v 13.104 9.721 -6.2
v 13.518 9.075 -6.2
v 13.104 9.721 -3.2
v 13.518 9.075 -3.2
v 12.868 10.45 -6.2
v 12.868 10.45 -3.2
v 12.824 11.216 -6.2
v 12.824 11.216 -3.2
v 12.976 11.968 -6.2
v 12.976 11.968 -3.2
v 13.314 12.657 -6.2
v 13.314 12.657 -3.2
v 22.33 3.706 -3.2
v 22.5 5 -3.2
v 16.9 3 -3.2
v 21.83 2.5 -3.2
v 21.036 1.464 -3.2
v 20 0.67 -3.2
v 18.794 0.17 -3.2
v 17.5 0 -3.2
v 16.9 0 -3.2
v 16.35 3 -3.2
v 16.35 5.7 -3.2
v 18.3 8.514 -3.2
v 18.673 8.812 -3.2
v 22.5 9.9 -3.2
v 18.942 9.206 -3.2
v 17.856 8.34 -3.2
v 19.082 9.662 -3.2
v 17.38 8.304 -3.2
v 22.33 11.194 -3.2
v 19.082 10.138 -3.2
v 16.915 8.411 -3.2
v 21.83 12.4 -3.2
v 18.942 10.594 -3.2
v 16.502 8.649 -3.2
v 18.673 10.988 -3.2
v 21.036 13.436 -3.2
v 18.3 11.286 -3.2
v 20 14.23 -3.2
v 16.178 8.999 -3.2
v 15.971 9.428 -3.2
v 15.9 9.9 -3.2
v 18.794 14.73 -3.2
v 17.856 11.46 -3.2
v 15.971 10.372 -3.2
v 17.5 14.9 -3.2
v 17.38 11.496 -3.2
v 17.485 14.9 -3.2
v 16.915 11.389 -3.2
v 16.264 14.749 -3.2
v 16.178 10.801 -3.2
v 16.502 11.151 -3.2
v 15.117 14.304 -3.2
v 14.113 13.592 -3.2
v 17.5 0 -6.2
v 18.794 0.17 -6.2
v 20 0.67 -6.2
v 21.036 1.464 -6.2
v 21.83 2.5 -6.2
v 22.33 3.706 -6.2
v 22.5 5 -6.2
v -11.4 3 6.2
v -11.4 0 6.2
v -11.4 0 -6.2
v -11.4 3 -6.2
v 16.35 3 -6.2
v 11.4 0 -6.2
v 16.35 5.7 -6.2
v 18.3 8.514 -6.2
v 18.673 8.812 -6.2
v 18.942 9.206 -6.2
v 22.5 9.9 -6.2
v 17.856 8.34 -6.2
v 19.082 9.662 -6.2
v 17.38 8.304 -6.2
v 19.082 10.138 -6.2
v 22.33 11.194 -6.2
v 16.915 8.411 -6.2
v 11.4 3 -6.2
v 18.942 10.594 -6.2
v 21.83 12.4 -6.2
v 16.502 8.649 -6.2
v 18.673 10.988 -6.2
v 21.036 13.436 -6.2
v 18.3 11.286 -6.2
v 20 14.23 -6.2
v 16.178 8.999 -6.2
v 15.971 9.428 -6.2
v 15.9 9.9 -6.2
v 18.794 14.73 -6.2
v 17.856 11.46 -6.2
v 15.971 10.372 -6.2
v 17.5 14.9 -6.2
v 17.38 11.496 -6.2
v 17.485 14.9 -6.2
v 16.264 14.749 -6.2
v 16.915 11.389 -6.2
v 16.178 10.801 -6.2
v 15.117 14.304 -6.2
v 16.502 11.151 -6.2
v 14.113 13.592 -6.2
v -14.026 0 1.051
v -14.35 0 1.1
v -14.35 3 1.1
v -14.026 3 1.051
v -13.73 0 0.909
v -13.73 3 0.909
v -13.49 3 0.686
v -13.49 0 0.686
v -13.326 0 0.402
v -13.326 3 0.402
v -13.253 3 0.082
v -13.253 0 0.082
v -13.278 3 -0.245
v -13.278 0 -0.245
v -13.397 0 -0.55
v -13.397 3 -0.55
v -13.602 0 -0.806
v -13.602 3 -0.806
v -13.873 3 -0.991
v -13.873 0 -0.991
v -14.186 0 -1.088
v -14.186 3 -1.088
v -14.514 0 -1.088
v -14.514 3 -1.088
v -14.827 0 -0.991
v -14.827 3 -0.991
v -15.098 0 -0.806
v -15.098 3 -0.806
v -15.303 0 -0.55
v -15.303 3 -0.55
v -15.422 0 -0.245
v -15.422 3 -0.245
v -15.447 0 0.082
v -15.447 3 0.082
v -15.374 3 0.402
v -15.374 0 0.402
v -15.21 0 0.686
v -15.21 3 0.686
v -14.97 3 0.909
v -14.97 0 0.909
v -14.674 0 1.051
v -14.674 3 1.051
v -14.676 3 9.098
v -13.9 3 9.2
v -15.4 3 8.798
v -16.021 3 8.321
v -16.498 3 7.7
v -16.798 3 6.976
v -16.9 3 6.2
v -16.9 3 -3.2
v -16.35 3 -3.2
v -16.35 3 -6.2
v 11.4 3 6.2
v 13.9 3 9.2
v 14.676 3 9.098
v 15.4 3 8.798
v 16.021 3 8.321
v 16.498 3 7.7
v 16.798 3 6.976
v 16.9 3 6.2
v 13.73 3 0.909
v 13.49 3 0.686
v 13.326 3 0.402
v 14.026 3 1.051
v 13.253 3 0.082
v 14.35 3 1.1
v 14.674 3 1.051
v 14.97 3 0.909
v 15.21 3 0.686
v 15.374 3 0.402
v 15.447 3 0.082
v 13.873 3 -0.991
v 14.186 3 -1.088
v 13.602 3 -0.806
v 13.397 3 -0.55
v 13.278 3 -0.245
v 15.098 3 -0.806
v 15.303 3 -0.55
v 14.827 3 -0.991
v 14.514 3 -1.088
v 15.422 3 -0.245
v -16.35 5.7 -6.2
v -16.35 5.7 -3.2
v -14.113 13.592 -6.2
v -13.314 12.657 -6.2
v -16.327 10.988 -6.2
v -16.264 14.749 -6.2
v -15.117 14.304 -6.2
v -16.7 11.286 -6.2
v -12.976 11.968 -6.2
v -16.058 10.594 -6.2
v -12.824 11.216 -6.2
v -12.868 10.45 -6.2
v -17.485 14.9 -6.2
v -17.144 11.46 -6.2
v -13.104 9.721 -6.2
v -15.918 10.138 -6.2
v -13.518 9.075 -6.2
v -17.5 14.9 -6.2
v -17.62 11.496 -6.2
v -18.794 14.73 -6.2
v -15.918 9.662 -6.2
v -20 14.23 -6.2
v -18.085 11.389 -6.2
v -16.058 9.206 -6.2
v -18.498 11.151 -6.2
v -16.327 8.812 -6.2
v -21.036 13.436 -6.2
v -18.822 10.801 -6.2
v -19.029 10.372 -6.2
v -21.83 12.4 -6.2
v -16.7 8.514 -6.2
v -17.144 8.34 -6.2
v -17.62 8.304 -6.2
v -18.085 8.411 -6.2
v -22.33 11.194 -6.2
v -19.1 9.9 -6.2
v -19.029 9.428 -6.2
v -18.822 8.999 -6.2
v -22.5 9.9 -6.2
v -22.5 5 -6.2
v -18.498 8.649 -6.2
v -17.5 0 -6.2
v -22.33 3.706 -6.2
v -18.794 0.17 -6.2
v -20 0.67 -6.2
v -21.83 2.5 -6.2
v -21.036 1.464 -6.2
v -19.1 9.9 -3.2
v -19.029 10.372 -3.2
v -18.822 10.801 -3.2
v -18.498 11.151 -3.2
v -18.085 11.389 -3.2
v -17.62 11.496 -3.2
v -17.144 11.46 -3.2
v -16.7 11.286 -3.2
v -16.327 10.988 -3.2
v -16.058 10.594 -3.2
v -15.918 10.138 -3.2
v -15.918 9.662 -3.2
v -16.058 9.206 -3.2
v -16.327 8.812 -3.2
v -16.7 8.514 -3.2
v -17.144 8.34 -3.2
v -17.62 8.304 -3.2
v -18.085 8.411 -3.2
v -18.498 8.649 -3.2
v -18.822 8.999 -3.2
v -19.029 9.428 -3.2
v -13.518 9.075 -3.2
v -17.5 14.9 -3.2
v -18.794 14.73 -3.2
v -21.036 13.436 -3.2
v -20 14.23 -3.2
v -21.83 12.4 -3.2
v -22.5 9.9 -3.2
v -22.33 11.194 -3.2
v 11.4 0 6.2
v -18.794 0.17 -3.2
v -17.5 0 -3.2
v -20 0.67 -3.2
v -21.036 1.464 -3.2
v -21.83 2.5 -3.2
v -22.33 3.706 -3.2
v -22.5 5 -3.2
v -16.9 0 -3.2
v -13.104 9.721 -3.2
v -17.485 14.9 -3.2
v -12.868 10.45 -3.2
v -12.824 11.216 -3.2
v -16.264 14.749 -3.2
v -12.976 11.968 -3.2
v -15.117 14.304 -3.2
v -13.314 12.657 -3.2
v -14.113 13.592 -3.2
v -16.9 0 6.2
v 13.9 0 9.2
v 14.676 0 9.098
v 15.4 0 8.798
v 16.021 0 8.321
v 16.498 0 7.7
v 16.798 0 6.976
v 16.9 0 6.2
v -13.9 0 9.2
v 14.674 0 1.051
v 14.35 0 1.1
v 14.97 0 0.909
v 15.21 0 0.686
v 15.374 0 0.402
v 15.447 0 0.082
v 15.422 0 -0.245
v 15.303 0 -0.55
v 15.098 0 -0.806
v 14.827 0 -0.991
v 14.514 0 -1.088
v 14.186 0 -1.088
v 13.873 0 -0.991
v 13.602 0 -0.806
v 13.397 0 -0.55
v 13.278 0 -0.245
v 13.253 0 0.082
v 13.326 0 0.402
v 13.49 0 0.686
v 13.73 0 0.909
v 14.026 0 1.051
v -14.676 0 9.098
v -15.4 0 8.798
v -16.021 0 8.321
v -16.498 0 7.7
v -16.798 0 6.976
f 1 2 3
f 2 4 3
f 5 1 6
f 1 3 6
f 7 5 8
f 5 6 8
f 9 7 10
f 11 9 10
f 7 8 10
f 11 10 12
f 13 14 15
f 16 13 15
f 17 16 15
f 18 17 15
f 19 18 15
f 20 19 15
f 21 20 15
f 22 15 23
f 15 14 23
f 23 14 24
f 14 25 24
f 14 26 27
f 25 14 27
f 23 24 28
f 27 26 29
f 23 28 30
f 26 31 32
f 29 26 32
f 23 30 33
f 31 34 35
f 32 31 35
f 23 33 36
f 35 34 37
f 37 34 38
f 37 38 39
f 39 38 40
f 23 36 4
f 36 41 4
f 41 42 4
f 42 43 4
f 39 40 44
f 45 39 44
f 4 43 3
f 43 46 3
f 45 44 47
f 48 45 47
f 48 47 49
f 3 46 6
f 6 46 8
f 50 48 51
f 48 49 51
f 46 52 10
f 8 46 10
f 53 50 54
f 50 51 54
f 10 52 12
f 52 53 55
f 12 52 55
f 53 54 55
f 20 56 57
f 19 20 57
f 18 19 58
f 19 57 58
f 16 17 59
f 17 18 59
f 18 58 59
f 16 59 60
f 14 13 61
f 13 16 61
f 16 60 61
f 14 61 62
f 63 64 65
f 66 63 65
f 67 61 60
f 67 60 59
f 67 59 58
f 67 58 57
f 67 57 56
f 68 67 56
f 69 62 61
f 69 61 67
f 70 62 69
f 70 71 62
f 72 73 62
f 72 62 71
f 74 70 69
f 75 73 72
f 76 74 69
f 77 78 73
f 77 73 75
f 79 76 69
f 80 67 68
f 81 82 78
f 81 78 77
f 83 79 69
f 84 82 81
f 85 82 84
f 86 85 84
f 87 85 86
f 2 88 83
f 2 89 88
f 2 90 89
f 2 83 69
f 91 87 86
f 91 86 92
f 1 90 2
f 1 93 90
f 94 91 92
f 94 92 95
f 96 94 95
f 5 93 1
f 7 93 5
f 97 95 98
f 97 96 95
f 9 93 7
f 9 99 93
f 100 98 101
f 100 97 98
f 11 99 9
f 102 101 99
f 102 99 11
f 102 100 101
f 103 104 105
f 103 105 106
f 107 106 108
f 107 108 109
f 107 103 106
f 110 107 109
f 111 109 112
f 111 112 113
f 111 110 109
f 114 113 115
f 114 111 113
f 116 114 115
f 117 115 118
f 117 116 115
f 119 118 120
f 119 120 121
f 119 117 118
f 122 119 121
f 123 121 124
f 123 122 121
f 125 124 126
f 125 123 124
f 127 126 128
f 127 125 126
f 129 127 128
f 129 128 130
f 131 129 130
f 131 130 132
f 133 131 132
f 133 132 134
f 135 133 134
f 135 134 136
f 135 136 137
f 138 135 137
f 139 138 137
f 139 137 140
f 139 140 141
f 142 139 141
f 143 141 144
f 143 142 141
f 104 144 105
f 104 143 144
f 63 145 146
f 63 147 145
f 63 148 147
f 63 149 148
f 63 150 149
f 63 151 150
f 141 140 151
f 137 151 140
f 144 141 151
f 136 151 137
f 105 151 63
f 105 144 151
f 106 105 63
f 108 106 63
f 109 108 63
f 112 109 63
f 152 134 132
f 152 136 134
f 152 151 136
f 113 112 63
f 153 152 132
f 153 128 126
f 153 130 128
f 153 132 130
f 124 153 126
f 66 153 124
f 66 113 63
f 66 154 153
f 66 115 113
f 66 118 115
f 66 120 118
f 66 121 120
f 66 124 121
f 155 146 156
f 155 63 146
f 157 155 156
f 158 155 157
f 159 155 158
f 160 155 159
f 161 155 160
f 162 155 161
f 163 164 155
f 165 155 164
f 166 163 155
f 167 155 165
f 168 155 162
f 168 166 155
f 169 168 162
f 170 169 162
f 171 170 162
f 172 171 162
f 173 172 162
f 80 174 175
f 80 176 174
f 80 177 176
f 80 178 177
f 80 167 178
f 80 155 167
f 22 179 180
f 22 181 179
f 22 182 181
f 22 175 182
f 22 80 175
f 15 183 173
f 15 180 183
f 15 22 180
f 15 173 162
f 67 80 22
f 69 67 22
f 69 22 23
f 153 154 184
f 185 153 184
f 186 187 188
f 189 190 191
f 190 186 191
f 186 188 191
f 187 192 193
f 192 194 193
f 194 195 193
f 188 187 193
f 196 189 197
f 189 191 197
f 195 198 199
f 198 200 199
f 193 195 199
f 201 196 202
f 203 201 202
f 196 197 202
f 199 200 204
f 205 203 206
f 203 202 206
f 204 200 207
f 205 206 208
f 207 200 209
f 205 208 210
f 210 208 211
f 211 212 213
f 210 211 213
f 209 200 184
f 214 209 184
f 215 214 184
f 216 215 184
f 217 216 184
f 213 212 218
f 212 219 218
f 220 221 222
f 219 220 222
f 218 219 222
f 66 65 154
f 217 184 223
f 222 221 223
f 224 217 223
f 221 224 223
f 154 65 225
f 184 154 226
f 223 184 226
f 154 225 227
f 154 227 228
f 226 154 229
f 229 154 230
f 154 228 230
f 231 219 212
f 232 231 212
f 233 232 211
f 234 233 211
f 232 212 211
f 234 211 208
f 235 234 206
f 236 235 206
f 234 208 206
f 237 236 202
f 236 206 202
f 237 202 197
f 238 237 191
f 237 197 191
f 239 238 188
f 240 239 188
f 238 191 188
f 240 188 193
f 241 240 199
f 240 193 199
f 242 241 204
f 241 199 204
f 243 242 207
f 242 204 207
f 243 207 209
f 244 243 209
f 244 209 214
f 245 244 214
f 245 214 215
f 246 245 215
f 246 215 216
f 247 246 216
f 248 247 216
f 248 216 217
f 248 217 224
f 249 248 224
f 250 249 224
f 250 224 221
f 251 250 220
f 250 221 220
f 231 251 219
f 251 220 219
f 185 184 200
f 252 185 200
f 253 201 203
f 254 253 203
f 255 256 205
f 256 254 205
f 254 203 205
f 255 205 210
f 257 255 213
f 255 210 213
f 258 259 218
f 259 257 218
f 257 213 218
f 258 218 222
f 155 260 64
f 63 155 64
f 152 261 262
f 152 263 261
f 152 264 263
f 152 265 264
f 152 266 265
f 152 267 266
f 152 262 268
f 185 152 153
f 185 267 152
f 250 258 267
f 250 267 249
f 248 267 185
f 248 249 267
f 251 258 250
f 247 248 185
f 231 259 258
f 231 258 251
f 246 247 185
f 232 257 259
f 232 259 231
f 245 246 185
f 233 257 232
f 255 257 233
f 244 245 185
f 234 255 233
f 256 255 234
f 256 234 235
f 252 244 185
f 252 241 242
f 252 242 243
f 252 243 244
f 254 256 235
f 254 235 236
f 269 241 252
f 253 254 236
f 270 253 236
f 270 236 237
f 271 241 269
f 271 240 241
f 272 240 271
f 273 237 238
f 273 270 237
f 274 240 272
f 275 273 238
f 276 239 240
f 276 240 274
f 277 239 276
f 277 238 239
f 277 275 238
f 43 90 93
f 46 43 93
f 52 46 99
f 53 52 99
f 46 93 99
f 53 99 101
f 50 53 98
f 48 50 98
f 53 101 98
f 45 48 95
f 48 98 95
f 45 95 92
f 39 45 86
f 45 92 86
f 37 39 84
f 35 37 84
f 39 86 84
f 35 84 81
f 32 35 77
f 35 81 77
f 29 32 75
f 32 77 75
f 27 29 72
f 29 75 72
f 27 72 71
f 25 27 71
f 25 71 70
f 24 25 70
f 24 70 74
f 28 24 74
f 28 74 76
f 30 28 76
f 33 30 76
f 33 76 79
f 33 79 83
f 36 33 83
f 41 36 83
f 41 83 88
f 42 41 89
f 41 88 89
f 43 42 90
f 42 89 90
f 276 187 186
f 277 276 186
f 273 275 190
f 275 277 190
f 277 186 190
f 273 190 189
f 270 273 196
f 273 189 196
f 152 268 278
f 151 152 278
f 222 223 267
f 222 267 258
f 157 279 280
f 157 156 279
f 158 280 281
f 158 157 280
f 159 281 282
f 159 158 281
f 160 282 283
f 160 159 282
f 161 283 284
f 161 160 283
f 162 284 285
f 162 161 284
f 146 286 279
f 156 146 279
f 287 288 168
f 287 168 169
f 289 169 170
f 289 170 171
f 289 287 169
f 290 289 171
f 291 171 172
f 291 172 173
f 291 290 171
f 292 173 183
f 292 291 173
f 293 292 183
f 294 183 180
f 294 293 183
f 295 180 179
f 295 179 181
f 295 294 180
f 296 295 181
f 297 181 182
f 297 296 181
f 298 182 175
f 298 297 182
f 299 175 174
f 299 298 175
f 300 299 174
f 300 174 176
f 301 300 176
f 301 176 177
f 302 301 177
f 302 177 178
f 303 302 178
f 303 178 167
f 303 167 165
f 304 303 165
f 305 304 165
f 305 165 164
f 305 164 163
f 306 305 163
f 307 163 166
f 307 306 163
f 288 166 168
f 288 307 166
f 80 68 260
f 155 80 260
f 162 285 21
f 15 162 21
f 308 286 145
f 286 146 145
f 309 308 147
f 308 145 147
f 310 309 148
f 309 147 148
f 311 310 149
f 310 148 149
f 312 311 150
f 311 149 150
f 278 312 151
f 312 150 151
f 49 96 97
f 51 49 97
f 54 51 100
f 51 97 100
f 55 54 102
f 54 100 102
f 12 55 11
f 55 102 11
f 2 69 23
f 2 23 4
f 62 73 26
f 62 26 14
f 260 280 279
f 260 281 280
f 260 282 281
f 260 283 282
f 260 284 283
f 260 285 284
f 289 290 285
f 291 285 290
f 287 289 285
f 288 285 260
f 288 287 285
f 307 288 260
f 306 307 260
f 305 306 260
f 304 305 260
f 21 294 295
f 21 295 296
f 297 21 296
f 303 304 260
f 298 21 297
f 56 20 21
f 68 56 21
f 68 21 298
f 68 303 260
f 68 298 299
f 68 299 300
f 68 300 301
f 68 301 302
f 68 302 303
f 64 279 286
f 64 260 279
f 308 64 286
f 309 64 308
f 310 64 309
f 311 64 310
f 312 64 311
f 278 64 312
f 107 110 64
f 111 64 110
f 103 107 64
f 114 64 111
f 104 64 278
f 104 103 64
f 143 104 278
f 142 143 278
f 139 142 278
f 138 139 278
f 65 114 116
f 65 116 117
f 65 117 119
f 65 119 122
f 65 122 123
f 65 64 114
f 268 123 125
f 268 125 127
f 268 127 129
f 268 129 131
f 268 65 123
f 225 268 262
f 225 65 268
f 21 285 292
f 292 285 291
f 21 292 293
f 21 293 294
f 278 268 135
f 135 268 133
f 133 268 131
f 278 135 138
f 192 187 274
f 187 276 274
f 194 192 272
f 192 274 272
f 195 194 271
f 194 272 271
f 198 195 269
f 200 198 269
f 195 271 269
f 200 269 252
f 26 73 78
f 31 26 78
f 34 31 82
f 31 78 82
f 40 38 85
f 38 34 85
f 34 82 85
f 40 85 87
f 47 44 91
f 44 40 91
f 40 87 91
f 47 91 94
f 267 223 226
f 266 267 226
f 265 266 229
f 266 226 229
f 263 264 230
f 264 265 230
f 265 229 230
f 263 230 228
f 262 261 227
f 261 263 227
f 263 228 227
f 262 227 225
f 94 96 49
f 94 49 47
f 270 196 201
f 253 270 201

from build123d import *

# Parameters (mm, degrees)
SKETCH1_R           = 1.1
BOSS_EXTRUDE1_DEPTH = 3
FILLET1_R           = 3
SKETCH2_R           = 1.6
BOSS_EXTRUDE2_DEPTH = 3
FILLET2_R           = 5
FILLET3_R           = 3


with BuildPart() as part:
    # Sketch1 → Boss-Extrude1 (new body)
    with BuildSketch(Plane(origin=(0, 0, 0), x_dir=(1, 0, 0), z_dir=(0, 1, 0))):
        Polygon((-16.9, -9.2), (16.9, -9.2), (16.9, 6.2), (11.4, 6.2), (11.4, -6.2), (-11.4, -6.2), (-11.4, 6.2), (-16.9, 6.2), align=None)
        with Locations(Location((-14.35, 0, 0), (0, 0, 270))):
            Circle(SKETCH1_R, mode=Mode.SUBTRACT)
        with Locations(Location((14.35, 0, 0), (0, 0, 270))):
            Circle(SKETCH1_R, mode=Mode.SUBTRACT)
    extrude(amount=BOSS_EXTRUDE1_DEPTH)

    # Fillet1
    fillet1_edges = [part.edges().sort_by_distance(p)[0] for p in [
        (16.9, 1.5, 9.2),
        (-16.9, 1.5, 9.2),
    ]]
    fillet(fillet1_edges, radius=FILLET1_R)

    # Sketch2 → Boss-Extrude2 (add)
    # profile 1 of 2: a face of its own
    with BuildSketch(Plane(origin=(0, 0, -6.2), x_dir=(-1, 0, 0), z_dir=(0, 0, -1))):
        Polygon((-16.35, 3), (-16.35, 5.7), (-12.5, 10.288251331), (-12.5, 14.9), (-22.5, 14.9), (-22.5, 4.9), (-22.5, 0), (-16.9, 0), (-16.9, 3), align=None)
        with Locations((-17.5, 9.9)):
            Circle(SKETCH2_R, mode=Mode.SUBTRACT)
    # profile 2 of 2: a face of its own
    with BuildSketch(Plane(origin=(0, 0, -6.2), x_dir=(-1, 0, 0), z_dir=(0, 0, -1))):
        Polygon((22.5, 14.9), (22.5, 4.9), (22.5, 0), (16.9, 0), (16.9, 3), (16.35, 3), (16.35, 5.7), (12.5, 10.288251331), (12.5, 14.9), align=None)
        with Locations((17.5, 9.9)):
            Circle(SKETCH2_R, mode=Mode.SUBTRACT)
    extrude(amount=-BOSS_EXTRUDE2_DEPTH)

    # Fillet2
    # the kernel refuses this fillet: 5 mm, written as the material it takes off along each edge
    with BuildSketch(Plane(origin=(22.5, 0, -18.7), x_dir=(0, 1, 0), z_dir=(0, 0, 1)), Plane(origin=(-22.5, 14.9, -18.7), x_dir=(0, -1, 0), z_dir=(0, 0, 1))) as fillet2_piece_1:
        with BuildLine():
            CenterArc((FILLET2_R, FILLET2_R), FILLET2_R, 180, 90)
            Line((0, FILLET2_R), (-FILLET2_R * 0.02, FILLET2_R))
            Line((-FILLET2_R * 0.02, FILLET2_R), (-FILLET2_R * 0.02, -FILLET2_R * 0.02))
            Line((-FILLET2_R * 0.02, -FILLET2_R * 0.02), (FILLET2_R, -FILLET2_R * 0.02))
            Line((FILLET2_R, -FILLET2_R * 0.02), (FILLET2_R, 0))
        make_face()
    extrude(amount=28, mode=Mode.SUBTRACT)
    with BuildSketch(Plane(origin=(-22.5, 0, -18.7), x_dir=(0, 1, 0), z_dir=(0, 0, 1)), Plane(origin=(22.5, 14.9, -18.7), x_dir=(0, -1, 0), z_dir=(0, 0, 1))) as fillet2_piece_2:
        with BuildLine():
            CenterArc((FILLET2_R, -FILLET2_R), FILLET2_R, 90, 90)
            Line((0, -FILLET2_R), (-FILLET2_R * 0.02, -FILLET2_R))
            Line((-FILLET2_R * 0.02, -FILLET2_R), (-FILLET2_R * 0.02, FILLET2_R * 0.02))
            Line((-FILLET2_R * 0.02, FILLET2_R * 0.02), (FILLET2_R, FILLET2_R * 0.02))
            Line((FILLET2_R, FILLET2_R * 0.02), (FILLET2_R, 0))
        make_face()
    extrude(amount=28, mode=Mode.SUBTRACT)
    with BuildSketch(Plane(origin=(-12.5, 14.9, -18.662258248), x_dir=(-1, 0, 0), z_dir=(0, 0, 1))) as fillet2_piece_3:
        with BuildLine():
            CenterArc((4.984903299, 5), FILLET2_R, 184.453515666, 85.546484334)
            Line((0, 4.611748669), (-0.099698066, 4.603983642))
            ThreePointArc((-0.099698066, 4.603983642), (-0.1, 2.305874334), (-0.1, 0))
            Line((-0.1, 0), (0, -0.1))
            Line((0, -0.1), (4.984903299, -0.1))
            Line((4.984903299, -0.1), (4.984903299, 0))
        make_face()
    extrude(amount=27.924516497, mode=Mode.SUBTRACT)
    with BuildSketch(Plane(origin=(12.5, 14.9, -18.662258248), x_dir=(1, 0, 0), z_dir=(0, 0, 1))) as fillet2_piece_4:
        with BuildLine():
            CenterArc((4.984903299, -5), FILLET2_R, 90, 85.546484334)
            Line((0, -4.611748669), (-0.099698066, -4.603983642))
            ThreePointArc((-0.099698066, -4.603983642), (-0.1, -2.305874334), (-0.1, 0))
            Line((-0.1, 0), (0, 0.1))
            Line((0, 0.1), (4.984903299, 0.1))
            Line((4.984903299, 0.1), (4.984903299, 0))
        make_face()
    extrude(amount=27.924516497, mode=Mode.SUBTRACT)

    # Fillet3
    fillet3_edges = [part.edges().sort_by_distance(p)[0] for p in [
        (-12.5, 10.288251331, -4.7),
        (12.5, 10.288251331, -4.7),
    ]]
    fillet(fillet3_edges, radius=FILLET3_R)


solid = part.part
